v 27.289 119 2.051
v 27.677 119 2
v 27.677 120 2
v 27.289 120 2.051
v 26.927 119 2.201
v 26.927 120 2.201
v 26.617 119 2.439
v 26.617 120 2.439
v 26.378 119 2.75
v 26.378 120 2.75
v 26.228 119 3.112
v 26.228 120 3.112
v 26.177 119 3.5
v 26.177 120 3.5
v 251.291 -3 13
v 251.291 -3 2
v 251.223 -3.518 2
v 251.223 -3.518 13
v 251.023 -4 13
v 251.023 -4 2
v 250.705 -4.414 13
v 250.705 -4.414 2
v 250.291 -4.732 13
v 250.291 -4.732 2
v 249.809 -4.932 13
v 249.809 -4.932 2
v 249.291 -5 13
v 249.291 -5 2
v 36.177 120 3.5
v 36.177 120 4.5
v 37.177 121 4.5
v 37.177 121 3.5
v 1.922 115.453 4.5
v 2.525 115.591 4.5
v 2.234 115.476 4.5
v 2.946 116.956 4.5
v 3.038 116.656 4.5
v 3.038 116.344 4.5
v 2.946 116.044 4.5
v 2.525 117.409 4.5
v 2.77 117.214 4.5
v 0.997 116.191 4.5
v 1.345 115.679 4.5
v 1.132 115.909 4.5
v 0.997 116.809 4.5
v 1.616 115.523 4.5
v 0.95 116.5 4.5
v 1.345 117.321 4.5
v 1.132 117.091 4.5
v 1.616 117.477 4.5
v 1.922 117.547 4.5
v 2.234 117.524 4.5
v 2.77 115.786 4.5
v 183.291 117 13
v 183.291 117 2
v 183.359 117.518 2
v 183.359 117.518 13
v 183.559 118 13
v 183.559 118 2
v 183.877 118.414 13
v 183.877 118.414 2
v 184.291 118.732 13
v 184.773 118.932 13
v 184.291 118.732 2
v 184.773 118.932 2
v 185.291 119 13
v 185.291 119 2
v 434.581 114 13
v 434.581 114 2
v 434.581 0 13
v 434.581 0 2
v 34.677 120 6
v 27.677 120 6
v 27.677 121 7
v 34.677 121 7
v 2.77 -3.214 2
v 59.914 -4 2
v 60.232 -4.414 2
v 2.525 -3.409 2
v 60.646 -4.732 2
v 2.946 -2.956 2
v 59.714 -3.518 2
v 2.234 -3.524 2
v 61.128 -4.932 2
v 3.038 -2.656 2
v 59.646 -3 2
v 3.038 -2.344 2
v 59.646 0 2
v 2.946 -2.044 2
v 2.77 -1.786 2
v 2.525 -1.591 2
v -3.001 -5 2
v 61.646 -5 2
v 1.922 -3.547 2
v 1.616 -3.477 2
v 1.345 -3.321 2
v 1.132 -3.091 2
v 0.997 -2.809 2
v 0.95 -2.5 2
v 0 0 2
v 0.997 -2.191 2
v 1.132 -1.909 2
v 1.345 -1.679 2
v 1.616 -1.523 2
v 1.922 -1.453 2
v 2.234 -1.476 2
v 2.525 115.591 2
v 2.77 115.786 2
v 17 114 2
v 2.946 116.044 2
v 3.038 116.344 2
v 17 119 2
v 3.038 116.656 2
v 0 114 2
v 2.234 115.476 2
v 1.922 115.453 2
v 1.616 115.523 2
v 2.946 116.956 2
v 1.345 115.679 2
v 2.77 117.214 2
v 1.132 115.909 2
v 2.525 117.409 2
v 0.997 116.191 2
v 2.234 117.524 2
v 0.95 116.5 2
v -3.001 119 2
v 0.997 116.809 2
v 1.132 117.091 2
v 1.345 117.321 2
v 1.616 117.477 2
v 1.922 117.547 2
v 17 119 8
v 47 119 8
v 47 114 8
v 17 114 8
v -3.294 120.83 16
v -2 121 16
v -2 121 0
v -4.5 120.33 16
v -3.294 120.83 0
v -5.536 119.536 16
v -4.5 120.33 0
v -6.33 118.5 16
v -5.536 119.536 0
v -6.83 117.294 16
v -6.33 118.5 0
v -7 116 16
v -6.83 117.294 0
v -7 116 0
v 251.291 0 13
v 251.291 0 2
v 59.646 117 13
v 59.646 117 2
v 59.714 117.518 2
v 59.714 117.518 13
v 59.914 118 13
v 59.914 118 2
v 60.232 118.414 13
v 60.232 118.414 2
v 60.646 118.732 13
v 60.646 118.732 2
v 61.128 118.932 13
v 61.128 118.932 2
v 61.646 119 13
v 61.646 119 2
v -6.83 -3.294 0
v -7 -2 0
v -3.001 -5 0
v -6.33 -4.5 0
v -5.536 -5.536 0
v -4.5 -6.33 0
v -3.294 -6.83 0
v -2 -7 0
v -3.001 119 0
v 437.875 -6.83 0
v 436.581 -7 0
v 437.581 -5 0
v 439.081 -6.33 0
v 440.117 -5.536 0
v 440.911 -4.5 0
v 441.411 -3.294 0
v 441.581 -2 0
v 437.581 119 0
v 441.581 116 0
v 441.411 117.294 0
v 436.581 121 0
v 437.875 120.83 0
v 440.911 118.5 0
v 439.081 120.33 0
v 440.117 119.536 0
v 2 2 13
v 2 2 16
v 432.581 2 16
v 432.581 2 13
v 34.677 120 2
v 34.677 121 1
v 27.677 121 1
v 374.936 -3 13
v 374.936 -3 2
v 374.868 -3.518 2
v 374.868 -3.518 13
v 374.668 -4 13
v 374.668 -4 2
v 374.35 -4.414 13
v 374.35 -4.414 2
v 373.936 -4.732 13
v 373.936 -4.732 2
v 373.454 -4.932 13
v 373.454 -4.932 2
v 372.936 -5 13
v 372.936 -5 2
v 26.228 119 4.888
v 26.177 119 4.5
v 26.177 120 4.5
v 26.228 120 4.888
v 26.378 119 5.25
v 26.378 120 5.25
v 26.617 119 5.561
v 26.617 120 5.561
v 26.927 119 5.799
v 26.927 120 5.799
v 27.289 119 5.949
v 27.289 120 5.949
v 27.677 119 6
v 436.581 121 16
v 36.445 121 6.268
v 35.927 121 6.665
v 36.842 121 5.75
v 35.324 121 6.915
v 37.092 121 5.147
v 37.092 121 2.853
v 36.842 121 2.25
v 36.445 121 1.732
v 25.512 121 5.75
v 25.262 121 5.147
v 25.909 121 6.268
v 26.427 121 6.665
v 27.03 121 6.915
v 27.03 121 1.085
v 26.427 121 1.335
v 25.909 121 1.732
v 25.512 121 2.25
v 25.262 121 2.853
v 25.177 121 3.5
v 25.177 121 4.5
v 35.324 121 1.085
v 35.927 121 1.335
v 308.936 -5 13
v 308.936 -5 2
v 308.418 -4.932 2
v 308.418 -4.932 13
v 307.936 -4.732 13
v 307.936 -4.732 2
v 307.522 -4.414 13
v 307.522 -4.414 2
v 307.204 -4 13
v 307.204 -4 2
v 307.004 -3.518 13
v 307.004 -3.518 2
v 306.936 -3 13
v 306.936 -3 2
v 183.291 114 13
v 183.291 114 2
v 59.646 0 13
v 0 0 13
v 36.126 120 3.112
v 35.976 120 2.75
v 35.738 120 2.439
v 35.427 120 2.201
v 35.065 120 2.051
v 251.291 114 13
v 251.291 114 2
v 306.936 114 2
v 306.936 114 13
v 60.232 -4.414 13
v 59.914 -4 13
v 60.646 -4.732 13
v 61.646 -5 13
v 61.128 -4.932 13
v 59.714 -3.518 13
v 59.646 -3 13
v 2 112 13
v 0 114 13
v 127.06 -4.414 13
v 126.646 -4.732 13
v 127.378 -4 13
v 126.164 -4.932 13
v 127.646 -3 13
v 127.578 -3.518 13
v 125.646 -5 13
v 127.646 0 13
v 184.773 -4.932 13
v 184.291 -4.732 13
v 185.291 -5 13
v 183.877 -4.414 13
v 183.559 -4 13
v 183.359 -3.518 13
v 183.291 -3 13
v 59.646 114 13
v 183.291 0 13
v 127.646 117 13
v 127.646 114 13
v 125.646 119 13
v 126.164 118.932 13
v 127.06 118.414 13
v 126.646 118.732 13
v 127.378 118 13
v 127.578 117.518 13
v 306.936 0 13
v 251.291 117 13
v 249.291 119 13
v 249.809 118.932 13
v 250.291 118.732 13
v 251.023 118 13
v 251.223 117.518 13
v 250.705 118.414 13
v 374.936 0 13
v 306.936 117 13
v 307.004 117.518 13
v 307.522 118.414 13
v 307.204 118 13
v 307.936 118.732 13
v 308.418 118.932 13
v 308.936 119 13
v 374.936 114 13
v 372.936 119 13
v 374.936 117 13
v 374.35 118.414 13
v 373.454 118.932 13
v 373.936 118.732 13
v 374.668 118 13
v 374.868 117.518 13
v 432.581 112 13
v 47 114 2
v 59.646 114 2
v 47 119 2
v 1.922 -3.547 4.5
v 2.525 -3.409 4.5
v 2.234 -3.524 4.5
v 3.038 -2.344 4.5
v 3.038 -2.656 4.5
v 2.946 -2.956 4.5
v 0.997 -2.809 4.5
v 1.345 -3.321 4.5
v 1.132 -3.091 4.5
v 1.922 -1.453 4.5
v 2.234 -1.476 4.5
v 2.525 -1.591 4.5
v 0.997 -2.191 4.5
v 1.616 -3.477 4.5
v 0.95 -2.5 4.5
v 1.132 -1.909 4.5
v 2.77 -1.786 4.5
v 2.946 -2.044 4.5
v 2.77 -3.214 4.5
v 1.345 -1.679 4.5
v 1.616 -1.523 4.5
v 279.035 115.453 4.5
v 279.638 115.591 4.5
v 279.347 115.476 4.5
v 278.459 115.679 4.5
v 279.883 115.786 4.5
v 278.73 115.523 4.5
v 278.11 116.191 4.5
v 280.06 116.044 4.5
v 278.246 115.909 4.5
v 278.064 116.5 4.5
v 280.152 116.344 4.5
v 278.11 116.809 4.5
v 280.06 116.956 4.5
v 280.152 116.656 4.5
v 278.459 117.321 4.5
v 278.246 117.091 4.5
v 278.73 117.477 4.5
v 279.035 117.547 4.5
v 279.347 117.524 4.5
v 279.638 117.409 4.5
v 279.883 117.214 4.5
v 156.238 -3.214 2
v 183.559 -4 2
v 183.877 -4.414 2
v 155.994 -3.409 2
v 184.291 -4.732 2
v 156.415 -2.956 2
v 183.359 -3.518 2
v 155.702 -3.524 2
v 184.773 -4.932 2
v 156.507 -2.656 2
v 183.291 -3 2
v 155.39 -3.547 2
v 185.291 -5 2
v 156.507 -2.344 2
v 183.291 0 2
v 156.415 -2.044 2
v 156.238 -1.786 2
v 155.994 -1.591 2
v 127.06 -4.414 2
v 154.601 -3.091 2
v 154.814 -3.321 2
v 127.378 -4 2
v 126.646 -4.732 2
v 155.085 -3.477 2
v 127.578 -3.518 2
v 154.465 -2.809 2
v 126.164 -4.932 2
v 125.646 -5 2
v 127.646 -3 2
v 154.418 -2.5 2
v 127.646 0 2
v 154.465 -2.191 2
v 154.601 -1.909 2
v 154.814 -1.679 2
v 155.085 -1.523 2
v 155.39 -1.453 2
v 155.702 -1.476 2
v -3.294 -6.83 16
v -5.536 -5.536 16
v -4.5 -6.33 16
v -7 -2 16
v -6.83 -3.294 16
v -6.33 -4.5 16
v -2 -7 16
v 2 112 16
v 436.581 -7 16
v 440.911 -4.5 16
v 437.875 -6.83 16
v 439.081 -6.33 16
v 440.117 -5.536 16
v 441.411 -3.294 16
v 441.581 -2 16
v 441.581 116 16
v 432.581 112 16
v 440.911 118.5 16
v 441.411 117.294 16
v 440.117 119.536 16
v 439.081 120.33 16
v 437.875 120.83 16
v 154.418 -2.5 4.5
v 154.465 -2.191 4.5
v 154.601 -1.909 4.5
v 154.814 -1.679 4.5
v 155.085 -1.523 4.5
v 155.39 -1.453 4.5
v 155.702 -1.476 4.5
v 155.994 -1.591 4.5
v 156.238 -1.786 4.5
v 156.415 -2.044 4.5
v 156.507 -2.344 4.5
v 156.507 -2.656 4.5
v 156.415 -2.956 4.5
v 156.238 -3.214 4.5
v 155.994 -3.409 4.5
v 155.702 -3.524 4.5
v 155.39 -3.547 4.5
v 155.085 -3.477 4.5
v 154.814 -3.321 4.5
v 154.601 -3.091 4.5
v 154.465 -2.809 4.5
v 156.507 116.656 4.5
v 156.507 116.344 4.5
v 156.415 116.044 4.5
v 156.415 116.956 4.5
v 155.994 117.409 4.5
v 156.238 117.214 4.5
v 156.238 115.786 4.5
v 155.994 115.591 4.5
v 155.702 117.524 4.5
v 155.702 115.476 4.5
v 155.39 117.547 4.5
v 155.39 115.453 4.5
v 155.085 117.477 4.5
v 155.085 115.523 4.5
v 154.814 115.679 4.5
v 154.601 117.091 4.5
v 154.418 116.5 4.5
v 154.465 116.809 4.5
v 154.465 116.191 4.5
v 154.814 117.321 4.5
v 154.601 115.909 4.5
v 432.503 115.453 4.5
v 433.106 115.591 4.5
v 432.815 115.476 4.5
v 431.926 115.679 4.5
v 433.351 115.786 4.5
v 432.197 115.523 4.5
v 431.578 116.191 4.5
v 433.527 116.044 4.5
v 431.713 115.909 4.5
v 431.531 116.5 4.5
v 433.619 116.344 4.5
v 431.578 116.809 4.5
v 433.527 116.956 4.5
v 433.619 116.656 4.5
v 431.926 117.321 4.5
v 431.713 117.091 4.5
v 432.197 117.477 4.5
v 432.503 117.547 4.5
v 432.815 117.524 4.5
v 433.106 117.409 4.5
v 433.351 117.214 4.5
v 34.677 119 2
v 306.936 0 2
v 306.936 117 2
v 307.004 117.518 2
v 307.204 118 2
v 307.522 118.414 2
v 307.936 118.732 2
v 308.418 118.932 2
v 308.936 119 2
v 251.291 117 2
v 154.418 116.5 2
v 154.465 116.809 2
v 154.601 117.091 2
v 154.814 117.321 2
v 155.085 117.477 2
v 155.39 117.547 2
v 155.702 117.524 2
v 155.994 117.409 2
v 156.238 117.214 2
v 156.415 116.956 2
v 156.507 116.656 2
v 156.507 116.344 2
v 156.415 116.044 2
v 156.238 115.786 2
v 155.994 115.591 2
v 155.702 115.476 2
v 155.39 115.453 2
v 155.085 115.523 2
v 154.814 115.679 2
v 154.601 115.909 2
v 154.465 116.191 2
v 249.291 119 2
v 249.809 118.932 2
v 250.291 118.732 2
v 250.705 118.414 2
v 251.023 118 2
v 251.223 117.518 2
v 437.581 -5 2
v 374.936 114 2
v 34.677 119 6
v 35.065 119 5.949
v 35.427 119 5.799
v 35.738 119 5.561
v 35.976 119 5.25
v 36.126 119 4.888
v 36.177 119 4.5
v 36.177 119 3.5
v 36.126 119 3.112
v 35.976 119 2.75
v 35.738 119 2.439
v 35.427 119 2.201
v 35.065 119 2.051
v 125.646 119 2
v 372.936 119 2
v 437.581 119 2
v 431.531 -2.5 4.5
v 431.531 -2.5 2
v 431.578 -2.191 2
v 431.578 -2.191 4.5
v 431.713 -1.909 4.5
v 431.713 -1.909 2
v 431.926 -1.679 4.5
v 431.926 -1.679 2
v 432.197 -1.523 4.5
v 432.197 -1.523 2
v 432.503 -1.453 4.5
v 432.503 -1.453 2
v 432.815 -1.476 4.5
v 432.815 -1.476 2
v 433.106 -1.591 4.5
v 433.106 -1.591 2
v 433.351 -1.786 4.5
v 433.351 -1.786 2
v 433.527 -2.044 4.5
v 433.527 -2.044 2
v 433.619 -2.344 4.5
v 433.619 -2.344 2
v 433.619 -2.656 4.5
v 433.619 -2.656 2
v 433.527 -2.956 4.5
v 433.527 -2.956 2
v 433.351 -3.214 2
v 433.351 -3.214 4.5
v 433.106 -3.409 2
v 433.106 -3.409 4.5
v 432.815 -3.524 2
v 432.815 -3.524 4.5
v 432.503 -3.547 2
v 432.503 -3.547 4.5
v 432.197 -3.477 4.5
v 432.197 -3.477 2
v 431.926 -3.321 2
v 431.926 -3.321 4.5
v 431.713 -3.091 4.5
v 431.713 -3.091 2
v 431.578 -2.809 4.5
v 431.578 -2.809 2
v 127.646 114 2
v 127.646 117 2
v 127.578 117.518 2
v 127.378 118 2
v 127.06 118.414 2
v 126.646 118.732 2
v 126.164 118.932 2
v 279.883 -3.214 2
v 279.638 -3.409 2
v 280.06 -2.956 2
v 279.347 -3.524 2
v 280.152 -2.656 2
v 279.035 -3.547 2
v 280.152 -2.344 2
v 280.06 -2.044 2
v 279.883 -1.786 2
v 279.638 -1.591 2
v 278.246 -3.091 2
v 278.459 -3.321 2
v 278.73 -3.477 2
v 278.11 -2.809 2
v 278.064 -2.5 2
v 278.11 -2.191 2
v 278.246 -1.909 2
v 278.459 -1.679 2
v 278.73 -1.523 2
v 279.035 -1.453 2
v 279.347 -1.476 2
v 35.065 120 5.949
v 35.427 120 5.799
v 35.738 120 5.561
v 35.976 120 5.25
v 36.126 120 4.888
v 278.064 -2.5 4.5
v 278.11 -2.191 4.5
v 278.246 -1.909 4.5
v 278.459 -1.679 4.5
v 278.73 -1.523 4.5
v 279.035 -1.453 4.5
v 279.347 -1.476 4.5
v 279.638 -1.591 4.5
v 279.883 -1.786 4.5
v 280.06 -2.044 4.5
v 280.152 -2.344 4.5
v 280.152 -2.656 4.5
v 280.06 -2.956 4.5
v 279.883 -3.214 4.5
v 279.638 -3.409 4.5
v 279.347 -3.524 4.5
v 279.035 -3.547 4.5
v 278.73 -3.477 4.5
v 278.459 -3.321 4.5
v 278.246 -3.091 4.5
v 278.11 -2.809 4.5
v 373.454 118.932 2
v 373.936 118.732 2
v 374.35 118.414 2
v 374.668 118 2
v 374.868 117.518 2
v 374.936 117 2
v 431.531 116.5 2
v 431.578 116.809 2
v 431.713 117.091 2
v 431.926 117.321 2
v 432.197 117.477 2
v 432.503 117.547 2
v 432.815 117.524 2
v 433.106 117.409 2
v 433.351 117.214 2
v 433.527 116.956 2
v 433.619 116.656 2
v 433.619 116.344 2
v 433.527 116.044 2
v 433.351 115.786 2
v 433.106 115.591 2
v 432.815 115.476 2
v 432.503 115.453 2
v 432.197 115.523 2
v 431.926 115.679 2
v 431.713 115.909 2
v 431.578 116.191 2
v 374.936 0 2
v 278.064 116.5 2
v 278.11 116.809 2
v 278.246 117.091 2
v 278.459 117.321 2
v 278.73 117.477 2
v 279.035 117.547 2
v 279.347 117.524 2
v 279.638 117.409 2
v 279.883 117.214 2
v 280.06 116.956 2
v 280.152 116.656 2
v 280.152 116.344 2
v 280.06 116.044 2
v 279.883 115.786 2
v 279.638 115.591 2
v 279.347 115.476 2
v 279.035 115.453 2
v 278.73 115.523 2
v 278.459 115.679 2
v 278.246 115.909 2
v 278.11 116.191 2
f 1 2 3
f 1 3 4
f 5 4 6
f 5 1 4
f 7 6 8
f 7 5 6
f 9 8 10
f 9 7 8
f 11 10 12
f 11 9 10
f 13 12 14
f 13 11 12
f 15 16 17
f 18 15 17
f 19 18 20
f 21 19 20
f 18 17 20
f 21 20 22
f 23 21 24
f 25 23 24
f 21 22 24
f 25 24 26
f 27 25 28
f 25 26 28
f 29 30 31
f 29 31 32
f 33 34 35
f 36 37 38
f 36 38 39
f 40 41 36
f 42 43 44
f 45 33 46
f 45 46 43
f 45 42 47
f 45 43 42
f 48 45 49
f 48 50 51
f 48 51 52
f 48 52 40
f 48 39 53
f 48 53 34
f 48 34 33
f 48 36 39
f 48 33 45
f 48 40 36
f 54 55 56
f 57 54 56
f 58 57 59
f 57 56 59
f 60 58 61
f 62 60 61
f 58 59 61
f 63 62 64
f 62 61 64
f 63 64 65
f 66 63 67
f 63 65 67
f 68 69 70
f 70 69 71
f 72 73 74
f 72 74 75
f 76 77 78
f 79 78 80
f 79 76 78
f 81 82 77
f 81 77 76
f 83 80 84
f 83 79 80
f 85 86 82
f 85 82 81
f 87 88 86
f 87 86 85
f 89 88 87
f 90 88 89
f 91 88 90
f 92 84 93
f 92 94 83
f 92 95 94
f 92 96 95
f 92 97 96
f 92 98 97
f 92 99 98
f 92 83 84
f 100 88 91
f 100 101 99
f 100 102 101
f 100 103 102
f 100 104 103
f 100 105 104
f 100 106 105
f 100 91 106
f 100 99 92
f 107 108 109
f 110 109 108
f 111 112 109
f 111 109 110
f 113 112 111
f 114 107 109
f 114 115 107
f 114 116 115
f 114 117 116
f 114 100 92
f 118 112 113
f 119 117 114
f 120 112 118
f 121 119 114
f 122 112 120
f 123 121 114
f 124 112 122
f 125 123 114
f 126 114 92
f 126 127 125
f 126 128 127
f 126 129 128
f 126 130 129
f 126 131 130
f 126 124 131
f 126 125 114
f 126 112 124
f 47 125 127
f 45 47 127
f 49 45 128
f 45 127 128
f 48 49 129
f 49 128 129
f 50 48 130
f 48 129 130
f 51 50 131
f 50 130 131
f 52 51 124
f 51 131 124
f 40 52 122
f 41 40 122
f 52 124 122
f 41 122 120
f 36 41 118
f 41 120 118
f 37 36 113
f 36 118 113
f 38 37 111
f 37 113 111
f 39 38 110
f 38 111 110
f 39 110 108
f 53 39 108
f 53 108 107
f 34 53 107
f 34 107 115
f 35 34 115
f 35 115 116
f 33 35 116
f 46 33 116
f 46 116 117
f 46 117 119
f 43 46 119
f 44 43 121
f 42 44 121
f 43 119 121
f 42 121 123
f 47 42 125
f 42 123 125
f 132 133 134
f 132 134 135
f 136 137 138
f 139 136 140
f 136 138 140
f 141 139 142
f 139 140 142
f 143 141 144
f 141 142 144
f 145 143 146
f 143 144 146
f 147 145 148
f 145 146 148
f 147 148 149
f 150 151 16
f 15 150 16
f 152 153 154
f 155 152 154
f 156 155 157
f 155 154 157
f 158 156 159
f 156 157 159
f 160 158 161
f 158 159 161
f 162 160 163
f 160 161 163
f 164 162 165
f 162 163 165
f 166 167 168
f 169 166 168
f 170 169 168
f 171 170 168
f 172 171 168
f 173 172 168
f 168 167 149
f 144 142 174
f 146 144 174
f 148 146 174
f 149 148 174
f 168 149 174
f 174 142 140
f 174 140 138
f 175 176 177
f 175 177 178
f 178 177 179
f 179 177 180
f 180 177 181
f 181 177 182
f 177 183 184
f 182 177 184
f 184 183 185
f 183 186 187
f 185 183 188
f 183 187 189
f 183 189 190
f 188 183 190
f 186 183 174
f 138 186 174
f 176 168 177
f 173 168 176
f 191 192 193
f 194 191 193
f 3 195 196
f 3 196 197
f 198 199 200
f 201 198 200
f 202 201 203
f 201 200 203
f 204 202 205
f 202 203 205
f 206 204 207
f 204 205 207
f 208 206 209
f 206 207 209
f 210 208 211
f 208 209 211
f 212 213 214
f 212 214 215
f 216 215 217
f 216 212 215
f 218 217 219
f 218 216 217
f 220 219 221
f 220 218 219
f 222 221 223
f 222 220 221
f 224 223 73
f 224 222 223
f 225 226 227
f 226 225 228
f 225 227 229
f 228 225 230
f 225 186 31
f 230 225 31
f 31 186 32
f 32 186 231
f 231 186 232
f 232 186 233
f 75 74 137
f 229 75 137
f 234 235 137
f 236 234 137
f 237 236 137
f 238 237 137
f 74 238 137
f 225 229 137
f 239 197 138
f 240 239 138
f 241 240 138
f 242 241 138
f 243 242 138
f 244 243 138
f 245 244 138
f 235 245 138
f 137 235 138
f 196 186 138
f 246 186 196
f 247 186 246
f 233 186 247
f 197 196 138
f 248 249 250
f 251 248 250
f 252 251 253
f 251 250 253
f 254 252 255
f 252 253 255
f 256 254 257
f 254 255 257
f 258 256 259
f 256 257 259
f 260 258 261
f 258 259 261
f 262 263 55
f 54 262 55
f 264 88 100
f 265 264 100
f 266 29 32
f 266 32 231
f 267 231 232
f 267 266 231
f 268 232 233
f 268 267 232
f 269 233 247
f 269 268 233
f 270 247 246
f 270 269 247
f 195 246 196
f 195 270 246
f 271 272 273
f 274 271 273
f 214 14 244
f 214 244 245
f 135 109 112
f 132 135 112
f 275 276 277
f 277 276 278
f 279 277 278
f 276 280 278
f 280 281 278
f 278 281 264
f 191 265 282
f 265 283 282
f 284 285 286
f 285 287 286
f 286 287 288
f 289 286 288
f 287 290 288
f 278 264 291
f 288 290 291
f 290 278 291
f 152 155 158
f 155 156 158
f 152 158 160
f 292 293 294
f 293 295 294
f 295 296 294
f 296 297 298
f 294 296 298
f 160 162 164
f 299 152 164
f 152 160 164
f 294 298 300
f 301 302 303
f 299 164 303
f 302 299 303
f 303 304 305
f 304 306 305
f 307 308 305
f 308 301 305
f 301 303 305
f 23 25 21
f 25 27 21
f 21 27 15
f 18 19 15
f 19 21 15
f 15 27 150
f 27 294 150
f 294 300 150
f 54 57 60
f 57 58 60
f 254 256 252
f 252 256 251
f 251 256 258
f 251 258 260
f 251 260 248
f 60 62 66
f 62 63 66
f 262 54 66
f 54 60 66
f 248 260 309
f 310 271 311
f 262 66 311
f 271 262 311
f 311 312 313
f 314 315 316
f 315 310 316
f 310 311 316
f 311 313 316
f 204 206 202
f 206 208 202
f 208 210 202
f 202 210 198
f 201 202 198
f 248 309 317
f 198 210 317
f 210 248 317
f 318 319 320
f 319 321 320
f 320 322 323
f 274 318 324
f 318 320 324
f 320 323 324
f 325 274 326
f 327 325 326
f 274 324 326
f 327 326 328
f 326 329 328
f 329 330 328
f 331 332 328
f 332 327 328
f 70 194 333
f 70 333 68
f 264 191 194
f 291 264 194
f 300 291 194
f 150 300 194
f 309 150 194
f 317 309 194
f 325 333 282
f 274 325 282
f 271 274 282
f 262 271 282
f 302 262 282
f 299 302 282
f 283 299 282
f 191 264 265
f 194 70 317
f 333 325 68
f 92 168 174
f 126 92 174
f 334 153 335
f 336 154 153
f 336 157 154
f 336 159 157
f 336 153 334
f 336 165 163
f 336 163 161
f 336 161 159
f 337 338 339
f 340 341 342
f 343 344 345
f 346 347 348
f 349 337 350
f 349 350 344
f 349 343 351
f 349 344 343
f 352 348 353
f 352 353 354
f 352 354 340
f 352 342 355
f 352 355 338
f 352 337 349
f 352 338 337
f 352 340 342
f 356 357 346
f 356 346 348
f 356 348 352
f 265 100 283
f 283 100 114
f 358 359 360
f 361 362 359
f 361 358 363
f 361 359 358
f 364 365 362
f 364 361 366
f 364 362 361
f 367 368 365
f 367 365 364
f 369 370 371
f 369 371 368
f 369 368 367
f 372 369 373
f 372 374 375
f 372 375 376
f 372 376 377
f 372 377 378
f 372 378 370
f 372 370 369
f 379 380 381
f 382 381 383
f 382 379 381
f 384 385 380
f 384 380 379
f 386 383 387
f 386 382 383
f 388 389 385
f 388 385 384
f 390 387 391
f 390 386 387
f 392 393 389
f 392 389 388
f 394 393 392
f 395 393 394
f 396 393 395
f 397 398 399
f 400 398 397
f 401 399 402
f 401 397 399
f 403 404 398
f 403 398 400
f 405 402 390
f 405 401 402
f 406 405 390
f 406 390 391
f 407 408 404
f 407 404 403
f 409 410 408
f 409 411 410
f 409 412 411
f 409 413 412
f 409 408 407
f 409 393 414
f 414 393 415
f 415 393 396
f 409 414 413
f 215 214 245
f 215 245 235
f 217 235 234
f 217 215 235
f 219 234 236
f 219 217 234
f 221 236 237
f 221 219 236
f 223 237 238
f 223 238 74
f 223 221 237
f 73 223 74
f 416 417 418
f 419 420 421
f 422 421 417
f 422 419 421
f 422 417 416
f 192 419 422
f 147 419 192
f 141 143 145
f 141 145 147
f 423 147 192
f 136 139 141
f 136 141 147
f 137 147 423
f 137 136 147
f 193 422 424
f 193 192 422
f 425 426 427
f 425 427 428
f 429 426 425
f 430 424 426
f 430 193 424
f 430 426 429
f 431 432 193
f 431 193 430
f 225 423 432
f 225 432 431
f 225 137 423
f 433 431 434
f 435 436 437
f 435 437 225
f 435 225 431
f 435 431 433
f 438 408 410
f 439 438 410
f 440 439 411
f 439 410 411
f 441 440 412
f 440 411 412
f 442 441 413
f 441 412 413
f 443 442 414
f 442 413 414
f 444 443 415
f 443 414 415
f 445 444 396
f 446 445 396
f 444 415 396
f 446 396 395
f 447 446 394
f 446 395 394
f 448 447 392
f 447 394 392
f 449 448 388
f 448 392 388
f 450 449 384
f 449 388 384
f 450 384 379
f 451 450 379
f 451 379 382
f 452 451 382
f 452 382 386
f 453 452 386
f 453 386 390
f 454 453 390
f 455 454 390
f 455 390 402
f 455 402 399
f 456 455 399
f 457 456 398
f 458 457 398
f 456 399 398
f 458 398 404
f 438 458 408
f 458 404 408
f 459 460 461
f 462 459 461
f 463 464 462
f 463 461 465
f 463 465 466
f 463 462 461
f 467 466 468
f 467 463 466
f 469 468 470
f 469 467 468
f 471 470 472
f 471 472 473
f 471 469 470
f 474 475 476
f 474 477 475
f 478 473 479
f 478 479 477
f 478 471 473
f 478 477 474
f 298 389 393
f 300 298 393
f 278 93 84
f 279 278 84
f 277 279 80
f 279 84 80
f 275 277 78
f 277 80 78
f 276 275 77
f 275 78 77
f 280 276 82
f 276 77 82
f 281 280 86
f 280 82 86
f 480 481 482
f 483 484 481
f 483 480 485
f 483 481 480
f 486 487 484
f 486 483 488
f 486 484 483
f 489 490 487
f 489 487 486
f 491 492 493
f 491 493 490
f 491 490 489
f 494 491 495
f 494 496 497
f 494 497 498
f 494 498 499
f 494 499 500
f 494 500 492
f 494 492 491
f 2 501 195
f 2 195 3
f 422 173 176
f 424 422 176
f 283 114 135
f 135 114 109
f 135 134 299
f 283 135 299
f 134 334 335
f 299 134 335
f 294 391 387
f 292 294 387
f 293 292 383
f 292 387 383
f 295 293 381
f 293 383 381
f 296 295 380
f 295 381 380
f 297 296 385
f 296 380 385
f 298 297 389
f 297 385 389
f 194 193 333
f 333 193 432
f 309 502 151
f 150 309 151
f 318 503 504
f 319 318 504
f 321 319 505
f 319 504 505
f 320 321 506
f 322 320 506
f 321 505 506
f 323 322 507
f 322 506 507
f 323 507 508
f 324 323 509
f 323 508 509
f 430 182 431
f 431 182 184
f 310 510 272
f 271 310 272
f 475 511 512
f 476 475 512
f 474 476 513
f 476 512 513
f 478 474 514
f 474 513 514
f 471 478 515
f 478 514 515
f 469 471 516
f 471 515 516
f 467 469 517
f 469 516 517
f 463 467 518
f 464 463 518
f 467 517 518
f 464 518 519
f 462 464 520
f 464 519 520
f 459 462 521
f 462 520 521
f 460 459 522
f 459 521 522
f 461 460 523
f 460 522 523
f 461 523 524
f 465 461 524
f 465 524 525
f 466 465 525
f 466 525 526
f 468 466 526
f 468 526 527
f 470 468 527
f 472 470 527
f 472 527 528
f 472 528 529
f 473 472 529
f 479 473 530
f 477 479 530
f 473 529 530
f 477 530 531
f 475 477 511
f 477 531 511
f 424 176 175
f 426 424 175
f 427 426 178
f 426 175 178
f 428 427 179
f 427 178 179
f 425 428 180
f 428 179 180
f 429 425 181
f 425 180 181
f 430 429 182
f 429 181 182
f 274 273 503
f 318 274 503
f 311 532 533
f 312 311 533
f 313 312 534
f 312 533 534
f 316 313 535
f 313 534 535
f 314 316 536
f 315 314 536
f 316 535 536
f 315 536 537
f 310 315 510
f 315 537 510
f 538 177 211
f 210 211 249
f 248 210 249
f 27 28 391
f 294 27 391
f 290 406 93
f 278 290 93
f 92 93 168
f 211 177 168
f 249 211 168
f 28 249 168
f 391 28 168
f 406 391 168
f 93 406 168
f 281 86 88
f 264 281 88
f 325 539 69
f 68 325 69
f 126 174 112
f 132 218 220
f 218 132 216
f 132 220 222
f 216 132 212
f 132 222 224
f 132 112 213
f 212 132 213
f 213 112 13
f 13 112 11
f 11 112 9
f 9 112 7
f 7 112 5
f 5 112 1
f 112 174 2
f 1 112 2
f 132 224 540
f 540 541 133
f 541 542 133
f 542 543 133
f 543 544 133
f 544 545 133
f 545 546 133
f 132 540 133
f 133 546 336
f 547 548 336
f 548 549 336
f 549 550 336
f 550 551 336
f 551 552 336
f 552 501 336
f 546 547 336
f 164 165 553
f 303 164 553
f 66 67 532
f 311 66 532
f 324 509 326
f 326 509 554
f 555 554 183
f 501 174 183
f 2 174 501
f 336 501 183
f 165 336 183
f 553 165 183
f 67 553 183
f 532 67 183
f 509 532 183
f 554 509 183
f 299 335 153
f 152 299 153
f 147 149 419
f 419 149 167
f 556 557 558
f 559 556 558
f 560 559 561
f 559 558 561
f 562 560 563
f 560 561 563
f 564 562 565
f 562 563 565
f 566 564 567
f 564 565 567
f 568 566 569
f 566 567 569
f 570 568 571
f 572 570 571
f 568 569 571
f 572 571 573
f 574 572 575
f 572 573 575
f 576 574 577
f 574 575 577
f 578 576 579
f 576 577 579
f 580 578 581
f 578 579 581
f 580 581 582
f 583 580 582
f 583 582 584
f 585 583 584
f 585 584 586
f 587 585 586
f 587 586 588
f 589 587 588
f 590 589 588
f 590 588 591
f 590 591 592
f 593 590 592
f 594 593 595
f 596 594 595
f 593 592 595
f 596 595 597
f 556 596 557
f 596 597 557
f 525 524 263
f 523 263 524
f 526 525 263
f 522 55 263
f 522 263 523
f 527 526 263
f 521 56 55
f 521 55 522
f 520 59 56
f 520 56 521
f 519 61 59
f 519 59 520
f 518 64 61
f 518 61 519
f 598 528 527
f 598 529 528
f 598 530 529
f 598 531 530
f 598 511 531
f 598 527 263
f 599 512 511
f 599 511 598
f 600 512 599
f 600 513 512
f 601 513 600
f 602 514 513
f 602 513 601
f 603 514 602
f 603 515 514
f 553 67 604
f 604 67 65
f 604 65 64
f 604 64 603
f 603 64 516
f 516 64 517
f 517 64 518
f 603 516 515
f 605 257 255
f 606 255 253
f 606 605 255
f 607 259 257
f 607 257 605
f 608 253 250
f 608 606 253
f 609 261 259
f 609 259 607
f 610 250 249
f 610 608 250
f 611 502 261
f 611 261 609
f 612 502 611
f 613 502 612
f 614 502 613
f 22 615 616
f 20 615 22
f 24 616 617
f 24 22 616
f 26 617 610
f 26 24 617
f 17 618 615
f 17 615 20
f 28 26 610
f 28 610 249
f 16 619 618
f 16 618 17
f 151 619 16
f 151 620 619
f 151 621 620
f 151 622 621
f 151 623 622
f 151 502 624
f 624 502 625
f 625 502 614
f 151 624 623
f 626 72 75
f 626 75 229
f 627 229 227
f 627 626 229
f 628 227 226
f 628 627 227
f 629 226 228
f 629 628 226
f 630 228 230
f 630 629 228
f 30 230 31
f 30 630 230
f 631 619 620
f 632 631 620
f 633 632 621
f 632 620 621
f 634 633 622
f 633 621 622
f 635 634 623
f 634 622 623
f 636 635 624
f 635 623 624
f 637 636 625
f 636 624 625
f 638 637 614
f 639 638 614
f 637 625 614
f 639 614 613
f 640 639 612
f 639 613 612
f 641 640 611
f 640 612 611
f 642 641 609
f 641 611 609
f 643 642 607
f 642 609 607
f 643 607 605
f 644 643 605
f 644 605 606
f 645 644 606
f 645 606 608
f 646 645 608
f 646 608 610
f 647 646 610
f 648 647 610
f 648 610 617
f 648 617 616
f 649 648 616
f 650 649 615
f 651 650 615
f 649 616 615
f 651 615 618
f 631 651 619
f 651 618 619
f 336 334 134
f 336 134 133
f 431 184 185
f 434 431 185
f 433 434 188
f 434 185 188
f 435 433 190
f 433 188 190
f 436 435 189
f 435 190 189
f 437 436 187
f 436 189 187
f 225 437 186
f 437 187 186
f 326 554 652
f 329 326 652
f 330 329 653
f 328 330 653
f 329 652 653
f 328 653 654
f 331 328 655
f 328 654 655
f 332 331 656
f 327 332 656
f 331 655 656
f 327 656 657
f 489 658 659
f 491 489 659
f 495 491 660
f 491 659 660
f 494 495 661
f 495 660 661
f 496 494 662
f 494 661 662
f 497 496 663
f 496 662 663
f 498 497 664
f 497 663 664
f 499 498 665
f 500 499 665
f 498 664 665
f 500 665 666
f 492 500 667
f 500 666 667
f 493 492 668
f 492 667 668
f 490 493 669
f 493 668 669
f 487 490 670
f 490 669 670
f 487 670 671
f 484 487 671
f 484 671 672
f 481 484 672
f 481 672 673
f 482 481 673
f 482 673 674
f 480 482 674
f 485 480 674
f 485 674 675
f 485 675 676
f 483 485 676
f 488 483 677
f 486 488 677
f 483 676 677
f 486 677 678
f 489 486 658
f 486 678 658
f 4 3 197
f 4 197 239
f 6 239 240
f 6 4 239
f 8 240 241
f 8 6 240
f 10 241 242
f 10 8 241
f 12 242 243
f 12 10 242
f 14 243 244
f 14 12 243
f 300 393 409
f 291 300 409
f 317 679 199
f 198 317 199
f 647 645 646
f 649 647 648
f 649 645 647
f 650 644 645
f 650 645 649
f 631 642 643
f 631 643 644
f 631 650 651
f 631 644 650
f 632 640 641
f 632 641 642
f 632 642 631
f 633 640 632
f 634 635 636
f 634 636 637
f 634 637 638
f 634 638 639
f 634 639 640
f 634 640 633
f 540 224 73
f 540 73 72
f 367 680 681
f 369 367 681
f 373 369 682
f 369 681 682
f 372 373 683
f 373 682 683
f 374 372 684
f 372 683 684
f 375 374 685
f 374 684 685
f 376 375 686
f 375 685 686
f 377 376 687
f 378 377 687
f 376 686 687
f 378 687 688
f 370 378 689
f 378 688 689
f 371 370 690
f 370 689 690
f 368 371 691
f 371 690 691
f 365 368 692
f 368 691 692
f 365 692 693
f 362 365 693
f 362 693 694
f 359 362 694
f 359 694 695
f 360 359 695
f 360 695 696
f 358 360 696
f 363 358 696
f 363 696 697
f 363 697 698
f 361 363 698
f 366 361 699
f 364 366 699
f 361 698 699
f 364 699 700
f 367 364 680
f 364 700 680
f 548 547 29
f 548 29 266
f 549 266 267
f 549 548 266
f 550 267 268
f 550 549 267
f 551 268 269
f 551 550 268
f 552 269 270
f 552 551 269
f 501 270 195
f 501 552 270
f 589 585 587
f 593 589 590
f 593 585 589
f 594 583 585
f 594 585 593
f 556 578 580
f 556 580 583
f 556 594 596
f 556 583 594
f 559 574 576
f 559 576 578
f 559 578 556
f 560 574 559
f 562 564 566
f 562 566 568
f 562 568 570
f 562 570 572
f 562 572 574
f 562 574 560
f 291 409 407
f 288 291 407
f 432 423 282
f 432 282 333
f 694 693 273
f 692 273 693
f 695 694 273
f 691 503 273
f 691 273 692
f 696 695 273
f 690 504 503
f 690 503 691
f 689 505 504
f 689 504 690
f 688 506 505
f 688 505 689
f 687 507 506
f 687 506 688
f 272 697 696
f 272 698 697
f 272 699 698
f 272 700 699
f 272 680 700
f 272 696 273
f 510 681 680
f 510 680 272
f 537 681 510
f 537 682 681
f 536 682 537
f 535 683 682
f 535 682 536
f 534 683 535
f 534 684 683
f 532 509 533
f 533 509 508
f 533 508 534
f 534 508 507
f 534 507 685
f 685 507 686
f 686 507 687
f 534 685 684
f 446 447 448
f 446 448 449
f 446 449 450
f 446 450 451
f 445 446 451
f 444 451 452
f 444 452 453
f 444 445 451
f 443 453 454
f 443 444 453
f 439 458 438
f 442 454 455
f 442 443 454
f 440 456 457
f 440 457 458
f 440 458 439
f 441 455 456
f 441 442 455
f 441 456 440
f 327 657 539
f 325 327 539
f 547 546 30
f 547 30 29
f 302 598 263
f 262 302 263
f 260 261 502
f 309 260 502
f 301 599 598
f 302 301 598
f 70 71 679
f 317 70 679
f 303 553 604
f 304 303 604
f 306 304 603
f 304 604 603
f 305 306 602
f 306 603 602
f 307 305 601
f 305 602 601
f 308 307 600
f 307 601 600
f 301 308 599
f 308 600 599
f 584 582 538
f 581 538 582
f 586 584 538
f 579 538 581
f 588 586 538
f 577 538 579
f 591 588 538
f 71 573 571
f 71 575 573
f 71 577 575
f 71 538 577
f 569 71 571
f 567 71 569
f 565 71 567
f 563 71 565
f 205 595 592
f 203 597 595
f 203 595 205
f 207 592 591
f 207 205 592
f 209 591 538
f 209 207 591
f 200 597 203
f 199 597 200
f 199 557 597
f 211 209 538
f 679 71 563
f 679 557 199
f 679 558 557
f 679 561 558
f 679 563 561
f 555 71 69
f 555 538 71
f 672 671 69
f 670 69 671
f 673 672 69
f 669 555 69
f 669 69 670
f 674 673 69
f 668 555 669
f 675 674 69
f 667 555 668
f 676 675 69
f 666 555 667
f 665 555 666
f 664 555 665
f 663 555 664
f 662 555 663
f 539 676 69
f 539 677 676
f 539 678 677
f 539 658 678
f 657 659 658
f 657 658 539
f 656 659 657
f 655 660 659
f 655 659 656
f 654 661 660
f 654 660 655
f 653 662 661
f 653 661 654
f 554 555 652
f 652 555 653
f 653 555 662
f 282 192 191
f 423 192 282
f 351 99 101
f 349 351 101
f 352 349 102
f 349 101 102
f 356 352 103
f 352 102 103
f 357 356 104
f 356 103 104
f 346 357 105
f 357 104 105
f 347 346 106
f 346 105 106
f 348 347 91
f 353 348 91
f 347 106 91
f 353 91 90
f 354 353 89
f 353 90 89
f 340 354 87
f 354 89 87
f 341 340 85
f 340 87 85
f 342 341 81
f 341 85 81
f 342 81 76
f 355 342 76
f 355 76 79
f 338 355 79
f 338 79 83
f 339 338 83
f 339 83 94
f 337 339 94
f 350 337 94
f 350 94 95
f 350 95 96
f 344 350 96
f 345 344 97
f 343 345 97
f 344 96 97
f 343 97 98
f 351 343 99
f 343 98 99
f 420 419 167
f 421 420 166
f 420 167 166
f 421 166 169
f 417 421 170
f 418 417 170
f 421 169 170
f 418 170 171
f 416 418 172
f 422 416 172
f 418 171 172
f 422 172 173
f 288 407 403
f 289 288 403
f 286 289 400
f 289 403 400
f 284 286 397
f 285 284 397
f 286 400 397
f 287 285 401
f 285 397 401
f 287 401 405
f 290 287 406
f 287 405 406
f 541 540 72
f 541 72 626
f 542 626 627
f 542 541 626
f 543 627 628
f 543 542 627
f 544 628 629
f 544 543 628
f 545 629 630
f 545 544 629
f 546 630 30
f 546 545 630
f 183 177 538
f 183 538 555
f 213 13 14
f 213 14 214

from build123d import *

# Parameters (mm, degrees)
BOSS_EXTRUDE1_DEPTH = 16
SKETCH2_W           = 438.581
SKETCH2_H           = 128
SKETCH2_W_2         = 430.581
SKETCH2_H_2         = 110
BOSS_EXTRUDE2_DEPTH = 3
SKETCH3_W           = 440.5822769
SKETCH3_H           = 124
CUT_EXTRUDE1_DEPTH  = 2
SKETCH4_R           = 1.05
CUT_EXTRUDE2_DEPTH  = 2.5
SKETCH5_W           = 30
SKETCH5_H           = 5
CUT_EXTRUDE3_DEPTH  = 6
CUT_EXTRUDE4_DEPTH  = 4
CHAMFER8_SIZE       = 1


with BuildPart() as part:
    # Sketch1 → Boss-Extrude1 (new body)
    with BuildSketch(Plane.XY):
        with BuildLine():
            ThreePointArc((-7, -2), (-5.535533906, -5.535533906), (-2, -7))
            Line((-2, -7), (436.581, -7))
            ThreePointArc((436.581, -7), (440.116533906, -5.535533906), (441.581, -2))
            Line((441.581, -2), (441.581, 116))
            ThreePointArc((441.581, 116), (440.116533906, 119.535533906), (436.581, 121))
            Line((436.581, 121), (-2, 121))
            ThreePointArc((-2, 121), (-5.535533906, 119.535533906), (-7, 116))
            Line((-7, 116), (-7, -2))
        make_face()
        with BuildLine():
            Line((251.291, 114), (306.936, 114))
            Line((306.936, 114), (306.936, 117))
            ThreePointArc((306.936, 117), (307.521786438, 118.414213562), (308.936, 119))
            Line((308.936, 119), (372.936, 119))
            ThreePointArc((372.936, 119), (374.350213562, 118.414213562), (374.936, 117))
            Line((374.936, 117), (374.936, 114))
            Line((374.936, 114), (434.581, 114))
            Line((434.581, 114), (434.581, 0))
            Line((434.581, 0), (374.936, 0))
            Line((374.936, 0), (374.936, -3))
            ThreePointArc((374.936, -3), (374.350213562, -4.414213562), (372.936, -5))
            Line((372.936, -5), (308.936, -5))
            ThreePointArc((308.936, -5), (307.521786438, -4.414213562), (306.936, -3))
            Line((306.936, -3), (306.936, 0))
            Line((306.936, 0), (251.291, 0))
            Line((251.291, 0), (251.291, -3))
            ThreePointArc((251.291, -3), (250.705213562, -4.414213562), (249.291, -5))
            Line((249.291, -5), (185.291, -5))
            ThreePointArc((185.291, -5), (183.876786438, -4.414213562), (183.291, -3))
            Line((183.291, -3), (183.291, 0))
            Line((183.291, 0), (127.646, 0))
            Line((127.646, 0), (127.646, -3))
            ThreePointArc((127.646, -3), (127.060213562, -4.414213562), (125.646, -5))
            Line((125.646, -5), (61.646, -5))
            ThreePointArc((61.646, -5), (60.231786438, -4.414213562), (59.646, -3))
            Line((59.646, -3), (59.646, 0))
            Line((59.646, 0), (0, 0))
            Line((0, 0), (0, 114))
            Line((0, 114), (59.646, 114))
            Line((59.646, 114), (59.646, 117))
            ThreePointArc((59.646, 117), (60.231786438, 118.414213562), (61.646, 119))
            Line((61.646, 119), (125.646, 119))
            ThreePointArc((125.646, 119), (127.060213562, 118.414213562), (127.646, 117))
            Line((127.646, 117), (127.646, 114))
            Line((127.646, 114), (183.291, 114))
            Line((183.291, 114), (183.291, 117))
            ThreePointArc((183.291, 117), (183.876786438, 118.414213562), (185.291, 119))
            Line((185.291, 119), (249.291, 119))
            ThreePointArc((249.291, 119), (250.705213562, 118.414213562), (251.291, 117))
            Line((251.291, 117), (251.291, 114))
        make_face(mode=Mode.SUBTRACT)
    extrude(amount=BOSS_EXTRUDE1_DEPTH)

    # Sketch2 → Boss-Extrude2 (add)
    with BuildSketch(Plane.XY.offset(16)):
        with Locations((217.2905, 57)):
            Rectangle(SKETCH2_W, SKETCH2_H)
        with Locations((217.2905, 57)):
            Rectangle(SKETCH2_W_2, SKETCH2_H_2, mode=Mode.SUBTRACT)
    extrude(amount=-BOSS_EXTRUDE2_DEPTH)

    # Sketch3 → Cut-Extrude1 (cut)
    with BuildSketch(Plane(origin=(0, 0, 0), x_dir=(-1, 0, 0), z_dir=(0, 0, -1))):
        with Locations((-217.28986155, 57)):
            Rectangle(SKETCH3_W, SKETCH3_H)
    extrude(amount=-CUT_EXTRUDE1_DEPTH, mode=Mode.SUBTRACT)

    # Sketch4 → Cut-Extrude2 (cut)
    with BuildSketch(Plane(origin=(0, 0, 2), x_dir=(-1, 0, 0), z_dir=(0, 0, -1))):
        with Locations((-279.1135, 116.5)):
            Circle(SKETCH4_R)
        with Locations((-155.4685, 116.5)):
            Circle(SKETCH4_R)
        with Locations((-279.1135, -2.5)):
            Circle(SKETCH4_R)
        with Locations((-155.4685, -2.5)):
            Circle(SKETCH4_R)
        with Locations((-2, -2.5)):
            Circle(SKETCH4_R)
        with Locations((-2, 116.5)):
            Circle(SKETCH4_R)
        with Locations((-432.581, 116.5)):
            Circle(SKETCH4_R)
        with Locations((-432.581, -2.5)):
            Circle(SKETCH4_R)
    extrude(amount=-CUT_EXTRUDE2_DEPTH, mode=Mode.SUBTRACT)

    # Sketch5 → Cut-Extrude3 (cut)
    with BuildSketch(Plane(origin=(0, 0, 2), x_dir=(-1, 0, 0), z_dir=(0, 0, -1))):
        with Locations((-32, 116.5)):
            Rectangle(SKETCH5_W, SKETCH5_H)
    extrude(amount=-CUT_EXTRUDE3_DEPTH, mode=Mode.SUBTRACT)

    # Sketch6 → Cut-Extrude4 (cut)
    with BuildSketch(Plane.XZ.offset(-119)):
        with BuildLine():
            Line((34.677255015, 2), (27.677255015, 2))
            ThreePointArc((27.677255015, 2), (26.616594843, 2.439339828), (26.177255015, 3.5))
            Line((26.177255015, 3.5), (26.177255015, 4.5))
            ThreePointArc((26.177255015, 4.5), (26.616594843, 5.560660172), (27.677255015, 6))
            Line((27.677255015, 6), (34.677255015, 6))
            ThreePointArc((34.677255015, 6), (35.737915187, 5.560660172), (36.177255015, 4.5))
            Line((36.177255015, 4.5), (36.177255015, 3.5))
            ThreePointArc((36.177255015, 3.5), (35.737915187, 2.439339828), (34.677255015, 2))
        make_face()
    extrude(amount=-CUT_EXTRUDE4_DEPTH, mode=Mode.SUBTRACT)

    # Chamfer8
    chamfer8_edges = [part.edges().sort_by_distance(p)[0] for p in [
        (31.177255015, 121, 6),
        (26.616594843, 121, 5.560660172),
        (26.177255015, 121, 4),
        (26.616594843, 121, 2.439339828),
        (31.177255015, 121, 2),
        (35.737915187, 121, 2.439339828),
        (36.177255015, 121, 4),
        (35.737915187, 121, 5.560660172),
    ]]
    chamfer(chamfer8_edges, length=CHAMFER8_SIZE)


solid = part.part
